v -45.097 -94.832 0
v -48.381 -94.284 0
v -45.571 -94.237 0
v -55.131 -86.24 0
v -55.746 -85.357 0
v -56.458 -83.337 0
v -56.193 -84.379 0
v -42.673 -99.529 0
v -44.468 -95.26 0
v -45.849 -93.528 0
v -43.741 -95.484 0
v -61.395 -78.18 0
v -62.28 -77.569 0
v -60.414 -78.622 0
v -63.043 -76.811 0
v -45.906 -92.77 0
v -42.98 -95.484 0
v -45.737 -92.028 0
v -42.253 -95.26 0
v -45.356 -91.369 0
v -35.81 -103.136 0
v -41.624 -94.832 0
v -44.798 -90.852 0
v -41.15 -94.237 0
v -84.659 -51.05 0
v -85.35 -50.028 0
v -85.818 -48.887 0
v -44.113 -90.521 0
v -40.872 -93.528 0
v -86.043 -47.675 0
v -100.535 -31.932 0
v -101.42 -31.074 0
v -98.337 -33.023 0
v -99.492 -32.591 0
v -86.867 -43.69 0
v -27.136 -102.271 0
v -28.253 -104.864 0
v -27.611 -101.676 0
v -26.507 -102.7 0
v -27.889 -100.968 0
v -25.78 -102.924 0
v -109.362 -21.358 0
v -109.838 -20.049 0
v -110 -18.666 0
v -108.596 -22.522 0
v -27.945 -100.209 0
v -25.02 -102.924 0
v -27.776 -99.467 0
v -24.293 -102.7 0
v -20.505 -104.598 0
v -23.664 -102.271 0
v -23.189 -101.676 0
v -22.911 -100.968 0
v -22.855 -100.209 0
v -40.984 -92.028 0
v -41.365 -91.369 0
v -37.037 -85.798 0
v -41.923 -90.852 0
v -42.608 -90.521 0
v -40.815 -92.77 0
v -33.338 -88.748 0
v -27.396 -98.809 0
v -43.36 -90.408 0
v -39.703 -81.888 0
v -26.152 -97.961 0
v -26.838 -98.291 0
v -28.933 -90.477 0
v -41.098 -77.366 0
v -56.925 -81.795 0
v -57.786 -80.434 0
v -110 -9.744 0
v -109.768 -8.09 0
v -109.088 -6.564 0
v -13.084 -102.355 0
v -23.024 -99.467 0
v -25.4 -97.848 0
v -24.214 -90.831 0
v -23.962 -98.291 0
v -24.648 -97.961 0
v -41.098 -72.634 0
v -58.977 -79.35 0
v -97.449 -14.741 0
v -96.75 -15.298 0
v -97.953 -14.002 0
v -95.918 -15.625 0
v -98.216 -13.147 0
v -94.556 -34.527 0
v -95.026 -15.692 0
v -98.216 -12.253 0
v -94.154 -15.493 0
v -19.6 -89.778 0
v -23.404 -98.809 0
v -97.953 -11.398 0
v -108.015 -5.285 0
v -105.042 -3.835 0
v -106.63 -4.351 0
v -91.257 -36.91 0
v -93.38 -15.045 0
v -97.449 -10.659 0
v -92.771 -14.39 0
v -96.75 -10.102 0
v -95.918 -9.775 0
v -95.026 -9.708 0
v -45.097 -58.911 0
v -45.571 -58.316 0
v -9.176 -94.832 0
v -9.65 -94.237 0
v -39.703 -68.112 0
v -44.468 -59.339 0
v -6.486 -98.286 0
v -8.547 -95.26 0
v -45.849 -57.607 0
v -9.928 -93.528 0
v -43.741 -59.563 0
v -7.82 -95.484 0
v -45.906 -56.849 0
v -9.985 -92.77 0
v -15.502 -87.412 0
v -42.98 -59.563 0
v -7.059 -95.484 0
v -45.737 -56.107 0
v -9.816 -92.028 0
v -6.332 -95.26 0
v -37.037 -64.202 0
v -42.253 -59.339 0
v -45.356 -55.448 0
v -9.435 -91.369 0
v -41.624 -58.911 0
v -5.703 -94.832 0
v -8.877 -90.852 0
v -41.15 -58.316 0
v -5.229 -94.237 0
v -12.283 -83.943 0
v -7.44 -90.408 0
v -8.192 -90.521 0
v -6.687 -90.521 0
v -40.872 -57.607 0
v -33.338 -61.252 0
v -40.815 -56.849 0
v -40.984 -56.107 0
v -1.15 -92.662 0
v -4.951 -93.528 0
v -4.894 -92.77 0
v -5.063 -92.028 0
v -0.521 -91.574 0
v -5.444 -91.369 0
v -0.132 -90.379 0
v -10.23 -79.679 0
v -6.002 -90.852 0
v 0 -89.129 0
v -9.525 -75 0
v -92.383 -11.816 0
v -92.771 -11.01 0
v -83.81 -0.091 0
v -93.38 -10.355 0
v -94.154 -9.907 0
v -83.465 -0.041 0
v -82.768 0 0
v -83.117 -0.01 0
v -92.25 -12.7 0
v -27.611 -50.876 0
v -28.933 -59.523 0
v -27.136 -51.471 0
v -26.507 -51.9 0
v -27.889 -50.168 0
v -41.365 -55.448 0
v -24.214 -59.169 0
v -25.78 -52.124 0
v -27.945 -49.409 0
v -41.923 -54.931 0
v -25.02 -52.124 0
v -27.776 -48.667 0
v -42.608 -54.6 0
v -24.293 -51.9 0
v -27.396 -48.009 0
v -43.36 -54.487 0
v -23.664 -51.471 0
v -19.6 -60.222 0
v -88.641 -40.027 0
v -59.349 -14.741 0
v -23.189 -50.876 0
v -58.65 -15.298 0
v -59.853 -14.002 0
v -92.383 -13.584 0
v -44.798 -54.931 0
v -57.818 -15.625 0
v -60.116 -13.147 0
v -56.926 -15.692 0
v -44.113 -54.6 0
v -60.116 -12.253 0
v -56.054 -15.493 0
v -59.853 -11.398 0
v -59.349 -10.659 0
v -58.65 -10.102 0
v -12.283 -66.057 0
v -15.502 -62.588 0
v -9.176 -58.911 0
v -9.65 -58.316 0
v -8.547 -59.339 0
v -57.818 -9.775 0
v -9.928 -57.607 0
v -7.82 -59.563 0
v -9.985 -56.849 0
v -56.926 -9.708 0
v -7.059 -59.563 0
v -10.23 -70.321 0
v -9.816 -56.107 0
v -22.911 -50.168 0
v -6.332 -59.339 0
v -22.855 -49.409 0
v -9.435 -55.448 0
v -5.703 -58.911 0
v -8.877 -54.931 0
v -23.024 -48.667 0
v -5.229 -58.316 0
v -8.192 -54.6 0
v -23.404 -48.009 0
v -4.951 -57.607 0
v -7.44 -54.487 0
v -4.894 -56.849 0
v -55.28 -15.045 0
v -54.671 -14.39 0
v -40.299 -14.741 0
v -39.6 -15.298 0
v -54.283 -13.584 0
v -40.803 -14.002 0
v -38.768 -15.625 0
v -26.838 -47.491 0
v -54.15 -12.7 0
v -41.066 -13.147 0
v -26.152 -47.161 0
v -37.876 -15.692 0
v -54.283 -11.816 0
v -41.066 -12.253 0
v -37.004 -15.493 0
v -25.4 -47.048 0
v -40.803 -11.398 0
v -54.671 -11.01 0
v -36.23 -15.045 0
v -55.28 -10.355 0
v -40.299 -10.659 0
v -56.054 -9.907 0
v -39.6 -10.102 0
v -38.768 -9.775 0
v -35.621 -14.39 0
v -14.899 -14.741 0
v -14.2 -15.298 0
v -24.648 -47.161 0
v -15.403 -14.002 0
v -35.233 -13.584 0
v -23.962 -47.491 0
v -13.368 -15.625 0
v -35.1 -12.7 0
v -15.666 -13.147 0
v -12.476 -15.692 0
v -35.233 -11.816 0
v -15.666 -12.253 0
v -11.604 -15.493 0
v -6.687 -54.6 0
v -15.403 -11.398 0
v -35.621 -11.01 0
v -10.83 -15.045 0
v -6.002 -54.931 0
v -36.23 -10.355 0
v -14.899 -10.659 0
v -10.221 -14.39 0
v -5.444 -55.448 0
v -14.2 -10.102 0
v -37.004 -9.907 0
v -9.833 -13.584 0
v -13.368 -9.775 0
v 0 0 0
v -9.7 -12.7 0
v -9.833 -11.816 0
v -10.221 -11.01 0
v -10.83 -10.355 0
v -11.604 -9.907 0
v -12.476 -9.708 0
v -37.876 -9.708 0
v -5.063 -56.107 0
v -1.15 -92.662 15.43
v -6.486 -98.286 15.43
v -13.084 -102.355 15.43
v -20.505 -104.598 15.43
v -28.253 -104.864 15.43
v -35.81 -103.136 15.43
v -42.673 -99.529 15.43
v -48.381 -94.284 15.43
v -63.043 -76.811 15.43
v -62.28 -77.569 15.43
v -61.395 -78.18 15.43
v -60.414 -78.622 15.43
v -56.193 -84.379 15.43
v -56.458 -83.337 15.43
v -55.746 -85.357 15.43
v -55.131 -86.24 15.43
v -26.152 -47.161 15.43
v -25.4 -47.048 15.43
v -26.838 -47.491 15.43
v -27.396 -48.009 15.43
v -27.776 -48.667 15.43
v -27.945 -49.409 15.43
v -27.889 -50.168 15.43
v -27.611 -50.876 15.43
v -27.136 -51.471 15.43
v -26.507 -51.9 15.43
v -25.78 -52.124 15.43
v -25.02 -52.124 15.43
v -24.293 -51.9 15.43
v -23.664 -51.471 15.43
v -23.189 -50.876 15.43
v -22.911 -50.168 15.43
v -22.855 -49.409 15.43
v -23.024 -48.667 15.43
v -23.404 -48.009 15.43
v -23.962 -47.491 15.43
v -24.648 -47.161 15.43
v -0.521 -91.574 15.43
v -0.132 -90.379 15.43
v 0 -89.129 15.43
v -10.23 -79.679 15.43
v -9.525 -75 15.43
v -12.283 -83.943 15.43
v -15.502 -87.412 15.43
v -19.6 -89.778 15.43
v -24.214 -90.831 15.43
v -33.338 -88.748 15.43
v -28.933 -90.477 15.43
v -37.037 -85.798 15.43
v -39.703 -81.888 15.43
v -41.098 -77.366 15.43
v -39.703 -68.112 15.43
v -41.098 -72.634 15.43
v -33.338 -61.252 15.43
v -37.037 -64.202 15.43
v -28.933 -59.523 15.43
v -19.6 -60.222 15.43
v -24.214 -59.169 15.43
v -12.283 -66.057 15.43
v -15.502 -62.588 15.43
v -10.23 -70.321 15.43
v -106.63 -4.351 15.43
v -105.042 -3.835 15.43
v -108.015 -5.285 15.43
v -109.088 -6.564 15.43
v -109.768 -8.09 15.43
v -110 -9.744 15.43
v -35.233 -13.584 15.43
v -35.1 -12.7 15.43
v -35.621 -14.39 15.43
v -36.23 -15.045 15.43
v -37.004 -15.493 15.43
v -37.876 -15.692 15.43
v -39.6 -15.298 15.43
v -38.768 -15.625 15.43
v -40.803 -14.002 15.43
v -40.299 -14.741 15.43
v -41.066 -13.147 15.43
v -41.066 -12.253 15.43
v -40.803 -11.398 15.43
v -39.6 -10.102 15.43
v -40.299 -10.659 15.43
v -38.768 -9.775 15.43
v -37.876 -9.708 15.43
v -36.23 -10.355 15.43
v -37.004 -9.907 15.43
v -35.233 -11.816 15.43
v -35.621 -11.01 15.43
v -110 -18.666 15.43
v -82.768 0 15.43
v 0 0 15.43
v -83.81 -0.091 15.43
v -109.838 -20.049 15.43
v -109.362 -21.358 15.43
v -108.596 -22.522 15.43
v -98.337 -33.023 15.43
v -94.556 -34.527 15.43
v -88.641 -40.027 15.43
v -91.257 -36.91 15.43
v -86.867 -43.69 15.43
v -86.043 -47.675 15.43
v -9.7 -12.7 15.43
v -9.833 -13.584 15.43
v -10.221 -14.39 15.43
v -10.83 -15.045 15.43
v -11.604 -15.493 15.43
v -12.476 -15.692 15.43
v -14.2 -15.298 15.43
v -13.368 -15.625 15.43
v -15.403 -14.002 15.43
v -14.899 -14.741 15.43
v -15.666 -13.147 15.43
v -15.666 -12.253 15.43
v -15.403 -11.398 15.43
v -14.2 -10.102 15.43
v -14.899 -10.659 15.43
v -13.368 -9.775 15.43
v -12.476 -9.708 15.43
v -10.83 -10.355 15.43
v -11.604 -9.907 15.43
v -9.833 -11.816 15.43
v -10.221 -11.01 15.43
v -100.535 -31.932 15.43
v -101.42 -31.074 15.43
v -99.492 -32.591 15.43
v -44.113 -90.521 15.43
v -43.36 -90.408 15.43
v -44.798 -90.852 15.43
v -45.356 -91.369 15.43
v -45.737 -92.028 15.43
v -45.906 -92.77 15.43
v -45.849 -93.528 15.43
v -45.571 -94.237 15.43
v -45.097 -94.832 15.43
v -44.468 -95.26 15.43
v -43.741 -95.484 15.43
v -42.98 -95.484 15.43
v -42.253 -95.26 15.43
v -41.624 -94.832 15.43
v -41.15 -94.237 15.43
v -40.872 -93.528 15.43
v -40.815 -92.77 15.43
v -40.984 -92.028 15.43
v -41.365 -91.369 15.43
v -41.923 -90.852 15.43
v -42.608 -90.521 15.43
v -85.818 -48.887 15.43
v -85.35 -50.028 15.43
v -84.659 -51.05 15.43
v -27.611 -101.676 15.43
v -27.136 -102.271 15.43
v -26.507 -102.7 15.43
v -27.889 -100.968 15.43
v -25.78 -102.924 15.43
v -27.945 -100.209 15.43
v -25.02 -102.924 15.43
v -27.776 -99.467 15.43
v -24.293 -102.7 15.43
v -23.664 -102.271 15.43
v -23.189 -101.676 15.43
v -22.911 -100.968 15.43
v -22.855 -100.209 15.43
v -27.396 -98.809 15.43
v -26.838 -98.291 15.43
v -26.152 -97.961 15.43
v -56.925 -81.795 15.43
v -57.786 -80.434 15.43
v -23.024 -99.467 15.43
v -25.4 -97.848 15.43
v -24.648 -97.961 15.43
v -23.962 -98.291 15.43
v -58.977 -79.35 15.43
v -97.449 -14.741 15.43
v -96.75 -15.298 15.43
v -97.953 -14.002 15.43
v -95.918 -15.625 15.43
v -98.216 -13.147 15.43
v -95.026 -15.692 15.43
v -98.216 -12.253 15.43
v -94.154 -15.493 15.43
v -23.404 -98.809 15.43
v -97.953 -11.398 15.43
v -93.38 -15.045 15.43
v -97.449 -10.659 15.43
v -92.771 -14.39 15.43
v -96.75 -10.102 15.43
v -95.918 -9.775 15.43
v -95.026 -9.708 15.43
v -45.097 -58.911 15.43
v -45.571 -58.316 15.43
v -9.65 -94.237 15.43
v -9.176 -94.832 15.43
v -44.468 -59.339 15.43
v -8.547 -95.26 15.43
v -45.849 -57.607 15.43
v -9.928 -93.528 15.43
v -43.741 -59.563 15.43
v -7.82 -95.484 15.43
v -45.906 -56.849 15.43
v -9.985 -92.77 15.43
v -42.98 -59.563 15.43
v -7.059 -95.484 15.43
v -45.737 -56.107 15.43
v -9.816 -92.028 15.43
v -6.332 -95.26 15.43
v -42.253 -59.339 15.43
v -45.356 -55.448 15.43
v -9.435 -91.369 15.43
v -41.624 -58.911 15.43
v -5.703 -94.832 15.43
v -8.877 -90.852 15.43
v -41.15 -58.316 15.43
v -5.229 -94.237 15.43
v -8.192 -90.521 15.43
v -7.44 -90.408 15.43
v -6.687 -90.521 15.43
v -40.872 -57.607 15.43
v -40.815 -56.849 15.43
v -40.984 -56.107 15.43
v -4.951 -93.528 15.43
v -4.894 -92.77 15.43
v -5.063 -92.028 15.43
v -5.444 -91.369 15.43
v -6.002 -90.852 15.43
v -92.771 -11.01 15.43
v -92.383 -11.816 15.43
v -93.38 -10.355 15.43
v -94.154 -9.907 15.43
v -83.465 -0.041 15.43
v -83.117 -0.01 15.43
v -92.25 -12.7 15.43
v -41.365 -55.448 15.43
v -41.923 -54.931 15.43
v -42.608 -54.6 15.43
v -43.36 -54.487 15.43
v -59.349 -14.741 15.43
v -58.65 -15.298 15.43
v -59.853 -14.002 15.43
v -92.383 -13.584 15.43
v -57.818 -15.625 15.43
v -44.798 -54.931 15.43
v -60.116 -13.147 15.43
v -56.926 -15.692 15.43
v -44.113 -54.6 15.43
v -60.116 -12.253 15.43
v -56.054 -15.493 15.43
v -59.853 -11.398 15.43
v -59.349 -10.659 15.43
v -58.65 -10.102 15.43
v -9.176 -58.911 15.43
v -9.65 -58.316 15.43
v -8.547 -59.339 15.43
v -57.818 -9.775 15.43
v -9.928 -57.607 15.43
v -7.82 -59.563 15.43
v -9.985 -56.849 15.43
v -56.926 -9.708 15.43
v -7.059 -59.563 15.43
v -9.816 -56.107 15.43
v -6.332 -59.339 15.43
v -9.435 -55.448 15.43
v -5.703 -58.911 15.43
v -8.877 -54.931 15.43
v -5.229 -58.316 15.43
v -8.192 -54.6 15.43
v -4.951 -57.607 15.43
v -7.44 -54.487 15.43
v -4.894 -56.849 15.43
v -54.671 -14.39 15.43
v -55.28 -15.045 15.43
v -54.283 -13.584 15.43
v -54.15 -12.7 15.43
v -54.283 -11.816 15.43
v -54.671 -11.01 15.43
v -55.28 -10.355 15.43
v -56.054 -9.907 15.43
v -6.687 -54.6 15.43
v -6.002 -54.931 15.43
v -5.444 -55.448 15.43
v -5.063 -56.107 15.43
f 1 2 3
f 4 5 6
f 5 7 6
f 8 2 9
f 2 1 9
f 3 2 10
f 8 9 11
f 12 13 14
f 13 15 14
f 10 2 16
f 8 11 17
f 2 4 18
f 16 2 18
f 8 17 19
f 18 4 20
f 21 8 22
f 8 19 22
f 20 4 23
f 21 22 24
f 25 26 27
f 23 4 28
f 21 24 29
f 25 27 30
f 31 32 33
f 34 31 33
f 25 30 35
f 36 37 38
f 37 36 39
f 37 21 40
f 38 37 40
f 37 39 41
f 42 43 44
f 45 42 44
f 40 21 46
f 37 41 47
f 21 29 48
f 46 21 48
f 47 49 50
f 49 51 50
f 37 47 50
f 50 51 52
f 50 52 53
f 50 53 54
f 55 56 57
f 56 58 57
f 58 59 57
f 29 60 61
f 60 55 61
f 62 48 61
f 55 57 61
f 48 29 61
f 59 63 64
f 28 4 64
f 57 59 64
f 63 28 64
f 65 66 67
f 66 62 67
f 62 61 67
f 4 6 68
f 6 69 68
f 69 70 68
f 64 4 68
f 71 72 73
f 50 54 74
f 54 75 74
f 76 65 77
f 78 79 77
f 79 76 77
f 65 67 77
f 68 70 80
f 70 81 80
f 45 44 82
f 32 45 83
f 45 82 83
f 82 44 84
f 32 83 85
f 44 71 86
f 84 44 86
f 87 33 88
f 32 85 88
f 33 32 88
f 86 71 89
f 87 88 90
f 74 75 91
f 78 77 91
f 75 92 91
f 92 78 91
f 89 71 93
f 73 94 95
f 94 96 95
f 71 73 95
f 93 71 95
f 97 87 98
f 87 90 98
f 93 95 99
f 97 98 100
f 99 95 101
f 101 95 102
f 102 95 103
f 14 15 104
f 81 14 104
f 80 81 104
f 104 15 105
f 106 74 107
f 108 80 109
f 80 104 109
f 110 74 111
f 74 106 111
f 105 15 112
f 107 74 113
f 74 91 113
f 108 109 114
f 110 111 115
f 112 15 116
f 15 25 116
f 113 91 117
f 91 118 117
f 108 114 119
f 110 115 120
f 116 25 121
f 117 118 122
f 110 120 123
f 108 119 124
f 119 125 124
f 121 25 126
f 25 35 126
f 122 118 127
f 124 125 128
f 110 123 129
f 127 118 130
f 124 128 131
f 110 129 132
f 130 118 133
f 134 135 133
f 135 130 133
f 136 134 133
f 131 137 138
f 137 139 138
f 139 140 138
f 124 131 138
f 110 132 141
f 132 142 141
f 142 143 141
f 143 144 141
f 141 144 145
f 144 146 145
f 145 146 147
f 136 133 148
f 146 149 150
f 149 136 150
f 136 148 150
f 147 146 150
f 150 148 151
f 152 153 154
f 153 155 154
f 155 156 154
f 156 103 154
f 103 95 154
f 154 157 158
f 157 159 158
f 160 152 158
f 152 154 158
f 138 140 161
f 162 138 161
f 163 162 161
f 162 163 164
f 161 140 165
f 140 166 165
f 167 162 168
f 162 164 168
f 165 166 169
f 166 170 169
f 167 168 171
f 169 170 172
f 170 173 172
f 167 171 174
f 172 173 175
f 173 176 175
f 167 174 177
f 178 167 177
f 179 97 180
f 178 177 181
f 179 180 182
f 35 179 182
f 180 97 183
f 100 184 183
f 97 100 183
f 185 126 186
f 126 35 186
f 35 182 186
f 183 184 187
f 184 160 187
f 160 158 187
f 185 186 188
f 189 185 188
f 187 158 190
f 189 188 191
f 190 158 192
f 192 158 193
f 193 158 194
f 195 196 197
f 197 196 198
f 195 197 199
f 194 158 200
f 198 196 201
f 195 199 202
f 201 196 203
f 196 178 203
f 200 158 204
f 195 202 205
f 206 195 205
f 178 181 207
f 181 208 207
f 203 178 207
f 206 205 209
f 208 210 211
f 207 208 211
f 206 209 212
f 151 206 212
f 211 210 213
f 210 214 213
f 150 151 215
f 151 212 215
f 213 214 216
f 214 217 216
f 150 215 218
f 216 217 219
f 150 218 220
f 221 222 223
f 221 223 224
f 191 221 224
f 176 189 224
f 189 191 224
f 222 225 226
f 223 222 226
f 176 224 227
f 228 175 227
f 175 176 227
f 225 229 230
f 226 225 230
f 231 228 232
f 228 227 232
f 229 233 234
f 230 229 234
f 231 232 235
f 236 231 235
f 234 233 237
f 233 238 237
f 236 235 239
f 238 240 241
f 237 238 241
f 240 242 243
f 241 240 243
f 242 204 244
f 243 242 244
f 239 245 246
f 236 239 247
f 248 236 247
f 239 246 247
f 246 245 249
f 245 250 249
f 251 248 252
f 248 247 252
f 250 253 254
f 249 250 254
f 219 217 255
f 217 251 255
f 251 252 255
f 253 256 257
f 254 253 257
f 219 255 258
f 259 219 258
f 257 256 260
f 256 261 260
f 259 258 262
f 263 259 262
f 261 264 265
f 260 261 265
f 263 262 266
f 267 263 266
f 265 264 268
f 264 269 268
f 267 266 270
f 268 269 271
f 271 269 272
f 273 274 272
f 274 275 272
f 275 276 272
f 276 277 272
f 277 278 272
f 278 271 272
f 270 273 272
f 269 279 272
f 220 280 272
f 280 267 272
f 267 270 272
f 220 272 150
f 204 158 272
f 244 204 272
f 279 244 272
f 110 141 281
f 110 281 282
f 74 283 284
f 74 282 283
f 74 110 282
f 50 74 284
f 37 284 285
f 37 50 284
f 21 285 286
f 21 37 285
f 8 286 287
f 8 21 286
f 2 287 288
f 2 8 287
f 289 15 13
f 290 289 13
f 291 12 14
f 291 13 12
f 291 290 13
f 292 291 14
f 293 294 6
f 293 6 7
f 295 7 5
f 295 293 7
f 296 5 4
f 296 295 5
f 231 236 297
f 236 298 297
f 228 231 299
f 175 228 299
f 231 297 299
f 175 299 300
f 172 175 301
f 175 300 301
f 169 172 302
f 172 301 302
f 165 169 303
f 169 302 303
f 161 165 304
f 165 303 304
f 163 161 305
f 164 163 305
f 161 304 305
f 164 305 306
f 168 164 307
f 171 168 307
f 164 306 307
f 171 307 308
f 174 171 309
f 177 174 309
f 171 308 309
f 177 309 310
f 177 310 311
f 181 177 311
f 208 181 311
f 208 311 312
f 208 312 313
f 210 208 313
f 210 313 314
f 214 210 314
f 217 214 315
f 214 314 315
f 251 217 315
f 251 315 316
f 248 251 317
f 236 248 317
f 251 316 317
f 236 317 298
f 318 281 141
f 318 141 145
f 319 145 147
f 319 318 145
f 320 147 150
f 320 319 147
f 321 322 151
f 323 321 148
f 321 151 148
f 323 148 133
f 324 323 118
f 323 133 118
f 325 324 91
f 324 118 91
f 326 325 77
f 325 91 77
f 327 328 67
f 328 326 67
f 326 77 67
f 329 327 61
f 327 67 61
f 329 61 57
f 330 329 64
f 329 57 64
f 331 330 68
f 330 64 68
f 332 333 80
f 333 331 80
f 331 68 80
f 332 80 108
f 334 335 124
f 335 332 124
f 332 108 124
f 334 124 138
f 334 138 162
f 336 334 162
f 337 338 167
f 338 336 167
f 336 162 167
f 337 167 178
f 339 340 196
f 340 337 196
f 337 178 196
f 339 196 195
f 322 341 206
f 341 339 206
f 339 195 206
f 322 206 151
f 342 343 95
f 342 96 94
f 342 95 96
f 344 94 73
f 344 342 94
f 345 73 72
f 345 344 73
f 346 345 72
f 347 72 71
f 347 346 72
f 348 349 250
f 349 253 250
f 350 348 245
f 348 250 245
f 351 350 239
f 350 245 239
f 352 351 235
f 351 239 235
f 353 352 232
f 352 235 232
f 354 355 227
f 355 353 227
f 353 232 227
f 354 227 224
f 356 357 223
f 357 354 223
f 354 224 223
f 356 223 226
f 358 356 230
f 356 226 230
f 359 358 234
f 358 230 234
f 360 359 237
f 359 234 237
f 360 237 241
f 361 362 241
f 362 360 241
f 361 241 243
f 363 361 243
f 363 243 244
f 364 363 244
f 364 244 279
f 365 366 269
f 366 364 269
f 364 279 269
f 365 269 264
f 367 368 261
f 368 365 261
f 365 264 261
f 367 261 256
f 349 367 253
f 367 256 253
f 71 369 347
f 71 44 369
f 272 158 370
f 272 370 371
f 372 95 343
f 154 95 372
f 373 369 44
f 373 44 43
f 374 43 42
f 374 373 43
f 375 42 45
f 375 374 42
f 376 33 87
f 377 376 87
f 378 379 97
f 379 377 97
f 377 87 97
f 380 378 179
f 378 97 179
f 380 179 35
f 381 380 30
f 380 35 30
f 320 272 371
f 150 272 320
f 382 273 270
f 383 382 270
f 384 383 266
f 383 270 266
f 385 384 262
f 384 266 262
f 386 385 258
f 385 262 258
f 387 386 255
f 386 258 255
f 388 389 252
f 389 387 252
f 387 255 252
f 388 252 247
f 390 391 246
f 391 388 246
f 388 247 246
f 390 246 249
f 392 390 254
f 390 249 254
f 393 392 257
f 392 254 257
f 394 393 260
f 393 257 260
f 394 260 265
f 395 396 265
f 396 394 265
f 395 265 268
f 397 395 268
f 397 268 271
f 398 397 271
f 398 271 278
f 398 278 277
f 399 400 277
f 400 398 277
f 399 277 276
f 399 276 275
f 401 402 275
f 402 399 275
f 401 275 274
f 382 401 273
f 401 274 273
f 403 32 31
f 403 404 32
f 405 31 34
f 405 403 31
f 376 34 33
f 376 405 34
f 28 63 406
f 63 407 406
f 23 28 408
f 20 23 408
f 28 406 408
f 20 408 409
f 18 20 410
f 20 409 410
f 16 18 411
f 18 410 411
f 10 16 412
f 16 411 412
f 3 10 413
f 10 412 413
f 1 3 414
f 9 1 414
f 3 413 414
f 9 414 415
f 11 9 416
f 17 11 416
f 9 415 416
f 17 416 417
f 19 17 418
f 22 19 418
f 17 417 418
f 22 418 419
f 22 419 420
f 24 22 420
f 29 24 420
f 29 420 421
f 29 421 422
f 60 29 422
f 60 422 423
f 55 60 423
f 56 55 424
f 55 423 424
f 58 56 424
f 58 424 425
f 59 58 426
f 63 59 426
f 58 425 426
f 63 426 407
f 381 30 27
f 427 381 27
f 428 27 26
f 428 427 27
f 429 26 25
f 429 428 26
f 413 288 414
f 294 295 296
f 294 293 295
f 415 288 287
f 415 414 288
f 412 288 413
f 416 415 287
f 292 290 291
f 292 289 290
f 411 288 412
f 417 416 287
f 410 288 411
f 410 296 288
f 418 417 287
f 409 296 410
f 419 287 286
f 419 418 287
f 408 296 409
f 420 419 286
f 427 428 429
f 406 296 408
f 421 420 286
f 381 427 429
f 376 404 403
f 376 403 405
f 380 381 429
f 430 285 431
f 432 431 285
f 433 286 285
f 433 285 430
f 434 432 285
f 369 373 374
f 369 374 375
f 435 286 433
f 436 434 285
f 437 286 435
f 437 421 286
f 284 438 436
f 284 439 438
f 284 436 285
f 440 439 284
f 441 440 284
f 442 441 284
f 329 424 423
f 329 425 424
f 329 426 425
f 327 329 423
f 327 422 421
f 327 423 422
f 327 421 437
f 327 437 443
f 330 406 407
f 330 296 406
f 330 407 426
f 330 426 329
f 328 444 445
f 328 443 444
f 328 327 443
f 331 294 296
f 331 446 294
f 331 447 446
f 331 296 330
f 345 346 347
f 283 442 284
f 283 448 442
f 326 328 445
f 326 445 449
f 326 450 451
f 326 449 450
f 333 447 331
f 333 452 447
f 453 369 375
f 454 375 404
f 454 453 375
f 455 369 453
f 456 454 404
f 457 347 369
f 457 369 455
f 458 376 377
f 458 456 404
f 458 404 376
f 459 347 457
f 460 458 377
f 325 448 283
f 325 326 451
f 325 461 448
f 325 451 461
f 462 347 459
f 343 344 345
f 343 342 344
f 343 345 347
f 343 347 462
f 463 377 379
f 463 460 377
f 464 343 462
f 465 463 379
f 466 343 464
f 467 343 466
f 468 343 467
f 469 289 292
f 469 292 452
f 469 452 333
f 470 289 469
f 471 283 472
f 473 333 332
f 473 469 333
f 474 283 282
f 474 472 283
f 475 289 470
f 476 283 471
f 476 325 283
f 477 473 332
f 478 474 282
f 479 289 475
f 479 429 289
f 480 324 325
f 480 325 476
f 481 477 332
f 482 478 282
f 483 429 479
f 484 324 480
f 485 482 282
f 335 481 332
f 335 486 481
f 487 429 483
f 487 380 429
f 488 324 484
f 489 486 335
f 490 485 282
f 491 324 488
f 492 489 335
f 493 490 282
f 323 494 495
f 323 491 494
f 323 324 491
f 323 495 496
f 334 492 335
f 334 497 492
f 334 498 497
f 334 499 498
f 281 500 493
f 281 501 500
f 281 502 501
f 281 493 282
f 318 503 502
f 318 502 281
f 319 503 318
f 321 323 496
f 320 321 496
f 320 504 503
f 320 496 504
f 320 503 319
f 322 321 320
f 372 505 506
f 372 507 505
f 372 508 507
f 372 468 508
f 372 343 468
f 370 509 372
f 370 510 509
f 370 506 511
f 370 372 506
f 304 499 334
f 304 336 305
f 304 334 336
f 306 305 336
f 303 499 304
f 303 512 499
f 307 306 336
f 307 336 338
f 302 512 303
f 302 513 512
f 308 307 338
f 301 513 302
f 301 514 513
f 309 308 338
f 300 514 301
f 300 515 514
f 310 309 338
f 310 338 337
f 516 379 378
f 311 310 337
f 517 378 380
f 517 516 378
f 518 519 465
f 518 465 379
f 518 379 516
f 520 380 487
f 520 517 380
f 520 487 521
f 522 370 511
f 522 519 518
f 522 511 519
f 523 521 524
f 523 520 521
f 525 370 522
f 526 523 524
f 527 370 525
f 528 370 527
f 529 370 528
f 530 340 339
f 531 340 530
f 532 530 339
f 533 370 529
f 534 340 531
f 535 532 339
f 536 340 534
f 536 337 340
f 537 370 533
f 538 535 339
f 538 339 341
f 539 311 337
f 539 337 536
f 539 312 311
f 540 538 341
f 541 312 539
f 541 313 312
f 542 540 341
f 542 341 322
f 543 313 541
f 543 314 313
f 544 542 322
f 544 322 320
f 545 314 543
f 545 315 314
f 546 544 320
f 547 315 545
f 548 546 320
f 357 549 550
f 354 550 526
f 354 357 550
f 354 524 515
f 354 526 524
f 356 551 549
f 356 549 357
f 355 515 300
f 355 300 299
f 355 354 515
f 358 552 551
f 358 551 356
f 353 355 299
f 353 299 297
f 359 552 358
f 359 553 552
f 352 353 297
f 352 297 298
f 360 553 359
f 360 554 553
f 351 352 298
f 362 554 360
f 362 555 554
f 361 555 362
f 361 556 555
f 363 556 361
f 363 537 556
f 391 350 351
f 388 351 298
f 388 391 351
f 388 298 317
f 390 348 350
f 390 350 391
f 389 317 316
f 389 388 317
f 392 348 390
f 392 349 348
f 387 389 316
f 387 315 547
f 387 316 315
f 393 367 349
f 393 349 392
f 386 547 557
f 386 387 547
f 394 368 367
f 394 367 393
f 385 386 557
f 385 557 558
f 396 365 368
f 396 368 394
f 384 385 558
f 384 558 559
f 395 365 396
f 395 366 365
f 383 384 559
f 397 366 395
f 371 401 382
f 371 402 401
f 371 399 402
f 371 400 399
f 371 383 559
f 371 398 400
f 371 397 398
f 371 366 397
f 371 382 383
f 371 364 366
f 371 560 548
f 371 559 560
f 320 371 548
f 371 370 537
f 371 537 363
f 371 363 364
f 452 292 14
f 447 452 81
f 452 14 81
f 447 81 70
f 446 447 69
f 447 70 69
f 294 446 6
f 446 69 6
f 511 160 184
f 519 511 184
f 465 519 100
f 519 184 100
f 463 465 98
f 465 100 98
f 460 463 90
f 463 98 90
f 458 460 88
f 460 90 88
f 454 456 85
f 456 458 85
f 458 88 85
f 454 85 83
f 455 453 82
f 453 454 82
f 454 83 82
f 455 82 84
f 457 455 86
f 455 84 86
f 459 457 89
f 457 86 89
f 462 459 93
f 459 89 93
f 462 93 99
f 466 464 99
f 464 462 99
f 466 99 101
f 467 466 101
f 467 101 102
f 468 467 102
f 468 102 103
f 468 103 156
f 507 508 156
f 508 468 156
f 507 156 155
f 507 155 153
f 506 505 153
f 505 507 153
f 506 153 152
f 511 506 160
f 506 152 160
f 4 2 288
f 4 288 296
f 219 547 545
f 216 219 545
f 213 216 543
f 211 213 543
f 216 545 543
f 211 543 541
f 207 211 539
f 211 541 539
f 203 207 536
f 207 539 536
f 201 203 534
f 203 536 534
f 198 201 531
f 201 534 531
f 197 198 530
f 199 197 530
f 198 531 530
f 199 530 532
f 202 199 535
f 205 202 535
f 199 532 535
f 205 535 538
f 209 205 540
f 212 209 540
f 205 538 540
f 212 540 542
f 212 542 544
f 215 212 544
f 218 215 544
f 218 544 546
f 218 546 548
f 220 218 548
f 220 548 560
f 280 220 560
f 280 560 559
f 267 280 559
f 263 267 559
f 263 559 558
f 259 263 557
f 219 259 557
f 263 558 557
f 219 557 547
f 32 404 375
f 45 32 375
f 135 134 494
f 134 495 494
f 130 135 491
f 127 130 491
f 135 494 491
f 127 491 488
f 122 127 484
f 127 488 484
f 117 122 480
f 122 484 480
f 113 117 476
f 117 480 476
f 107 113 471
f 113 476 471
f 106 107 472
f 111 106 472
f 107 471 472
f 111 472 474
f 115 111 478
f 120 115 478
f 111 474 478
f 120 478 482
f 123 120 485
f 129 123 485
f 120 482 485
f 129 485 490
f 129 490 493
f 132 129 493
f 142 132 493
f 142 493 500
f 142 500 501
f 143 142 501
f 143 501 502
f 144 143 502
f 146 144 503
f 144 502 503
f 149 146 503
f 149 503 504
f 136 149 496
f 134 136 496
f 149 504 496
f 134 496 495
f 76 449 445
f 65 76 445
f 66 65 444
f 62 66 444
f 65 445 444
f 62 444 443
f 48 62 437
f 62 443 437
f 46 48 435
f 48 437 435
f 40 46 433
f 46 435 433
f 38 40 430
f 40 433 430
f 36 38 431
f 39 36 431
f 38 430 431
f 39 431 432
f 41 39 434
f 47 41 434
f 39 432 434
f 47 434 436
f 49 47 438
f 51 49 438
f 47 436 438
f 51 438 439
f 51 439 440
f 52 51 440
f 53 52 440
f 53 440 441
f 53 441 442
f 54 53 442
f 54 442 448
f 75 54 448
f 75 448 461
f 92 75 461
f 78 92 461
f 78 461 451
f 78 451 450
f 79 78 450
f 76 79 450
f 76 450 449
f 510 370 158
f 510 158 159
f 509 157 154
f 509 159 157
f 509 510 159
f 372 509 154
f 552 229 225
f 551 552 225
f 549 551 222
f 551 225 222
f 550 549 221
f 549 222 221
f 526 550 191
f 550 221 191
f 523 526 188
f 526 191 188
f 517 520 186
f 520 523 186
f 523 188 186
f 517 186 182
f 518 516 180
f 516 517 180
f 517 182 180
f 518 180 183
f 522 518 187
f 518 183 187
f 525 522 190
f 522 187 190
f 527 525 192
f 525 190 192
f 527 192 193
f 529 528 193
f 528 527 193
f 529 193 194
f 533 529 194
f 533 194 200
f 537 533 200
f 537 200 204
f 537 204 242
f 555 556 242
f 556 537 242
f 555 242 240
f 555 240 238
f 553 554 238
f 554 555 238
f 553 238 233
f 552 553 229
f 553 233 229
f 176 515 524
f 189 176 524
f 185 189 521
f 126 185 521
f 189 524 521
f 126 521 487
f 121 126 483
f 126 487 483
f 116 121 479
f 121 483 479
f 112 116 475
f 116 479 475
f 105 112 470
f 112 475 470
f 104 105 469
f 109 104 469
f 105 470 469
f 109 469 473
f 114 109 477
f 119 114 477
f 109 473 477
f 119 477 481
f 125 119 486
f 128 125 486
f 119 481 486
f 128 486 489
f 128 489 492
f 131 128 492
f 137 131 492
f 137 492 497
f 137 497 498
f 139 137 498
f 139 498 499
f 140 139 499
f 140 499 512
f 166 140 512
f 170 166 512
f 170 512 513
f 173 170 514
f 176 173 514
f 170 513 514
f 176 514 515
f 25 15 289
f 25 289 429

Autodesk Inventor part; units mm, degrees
ref_plane "YZ Plane" through (0, 0, 0) normal (1, 0, 0) x (0, 1, 0)
ref_plane "XZ Plane" through (0, 0, 0) normal (0, 1, 0) x (-1, 0, 0)
ref_plane "XY Plane" through (0, 0, 0) normal (0, 0, 1) x (1, 0, 0)
sketch "Sketch1" plane through (0, 0, 0) normal (0, 0, 1) x (1, 0, 0)
  line L0 (-110, -20.8494) -> (-110, 0)
  line L1 (-110, 0) -> (0, 0)
  line L2 (0, 0) -> (0, -105)
  line L3 (0, -105) -> (-39.3892, -105)
  line L4 (-110, -20.8494) -> (-119.38, 0) construction
  line L5 (-119.38, 0) -> (-110, 0) construction
  line L6 (-50.8, -25.4) -> (0, -25.4) construction
  line L7 (0, -25.4) -> (0, 0) construction
  line L8 (0, 0) -> (-50.8, 0) construction
  line L9 (-50.8, 0) -> (-50.8, -25.4) construction
  line L10 (-50.8, -25.4) -> (0, 0) construction
  line L11 (0, -25.4) -> (-50.8, 0) construction
  circle A0 centre (-12.7, -12.7) radius 3
  circle A1 centre (-38.1, -12.7) radius 3
  circle A2 centre (-25.4, -75) radius 15.875
  circle A3 centre (-25.4, -75) radius 30
  line L12 (-50.8, -90.9637) -> (-50.8, -59.0363)
  line L13 (-110, -4.7091) -> (-83.2932, 0)
  arc A4 (-56.3982, -84.7295) -> (-61.7755, -78.3211) centre (-62.3821, -84.2903) ccw
  line L14 (-39.3892, -105) -> (-56.3982, -84.7295)
  arc A5 (-85.9963, -49.4559) -> (-100.0831, -32.6679) centre (-102.5, -49) ccw
  line L15 (-61.7755, -78.3211) -> (-85.9963, -49.4559)
  line L16 (-100.0831, -32.6679) -> (-110, -20.8494)
  circle A6 centre (-95.25, -12.7) radius 3
  circle A7 centre (-57.15, -12.7) radius 3
  point P0 (0, 0)
  point P1 (-25.4, -12.7)
  point P2 (-25.4, -25.4)
  point P3 (-50.8, -75)
  point P4 (0, -90.9637)
  point P5 (-110, -10.4247)
  point P6 (-48.3813, -94.2836)
  point P7 (0, -59.0363)
  point P8 (-25.4, -105)
  dimension "d1" = 119.38
  dimension "d2" = 50.8
  dimension "d3" = 25.4
  dimension "d4" = 25.4
  dimension "d5" = 12.7
  dimension "d6" = 6
  dimension "d7" = 6
  dimension "d11" = 110
  dimension "d12" = 60
  dimension "d13" = 25.4
  dimension "d14" = 25.4
  dimension "d17" = 20.8494
  dimension "d18" = 31.75
  dimension "d21" = 170
  dimension "d22" = 26.7068
  dimension "d24" = 86.6409
  dimension "d25" = 12
  dimension "d26" = 47.6179
  dimension "d28" = 81.3659
  dimension "d29" = 33.02
  dimension "d30" = 49
  dimension "d31" = 50
  dimension "d41" = 19.05
  dimension "d42" = 38.1
extrude "Extrusion1" add sketch "Sketch1" along normal blind 15.4305 contours L0 L13 L1 L2 A3 L14 A4 L15 A5 L16 | L2 A3 L12 | L12 A3
fillet "Fillet1" radius 6 8 edges at (0, -90.9637, 7.7153) (-110, -20.8494, 7.7153) (-110, -4.7091, 7.7153) (-83.2932, 0, 7.7153) (-56.3982, -84.7295, 7.7153) (-61.7755, -78.3211, 7.7153) (-85.9963, -49.4559, 7.7153) (-100.0831, -32.6679, 7.7153)
sketch "Sketch2" plane through (0, 0, 0) normal (0, 0, -1) x (-1, 0, 0)
  circle A0 centre (25.4, -75) radius 15.875 projected
  circle A1 centre (25.4, -75) radius 25.4
  line L0 (7.4395, -92.9605) -> (7.4395, -57.0395)
  line L1 (43.3605, -57.0395) -> (43.3605, -92.9605)
  line L2 (7.4395, -92.9605) -> (25.4, -75)
  line L3 (25.4, -75) -> (43.3605, -57.0395)
  point P0 (0, 0)
  point P1 (25.4, -100.4)
  point P2 (25.4, -49.6)
  dimension "d32" = 50.8
  dimension "d33" = 45
hole "Hole1" at (-7.4395, -92.9605, 0) at (-7.4395, -57.0395, 0) at (-43.3605, -57.0395, 0) at (-43.3605, -92.9605, 0) at (-25.4, -100.4, 0) at (-25.4, -49.6, 0) direction (0, 0, 1) diameter 5.105 end through all clearance for "Flat Head Machine Screw (82)" size "#10" standard "Ansi Unified Screw Threads"
equation "\"d5\" = 0.5 * d4"
equation "\"d7\" = d6"
equation "\"d14\" = d13"
properties part number "OUTSIDE_INTAKE_SPACERS" material "3D Print Material - chopped carbon Nylon12 (preferred)"
